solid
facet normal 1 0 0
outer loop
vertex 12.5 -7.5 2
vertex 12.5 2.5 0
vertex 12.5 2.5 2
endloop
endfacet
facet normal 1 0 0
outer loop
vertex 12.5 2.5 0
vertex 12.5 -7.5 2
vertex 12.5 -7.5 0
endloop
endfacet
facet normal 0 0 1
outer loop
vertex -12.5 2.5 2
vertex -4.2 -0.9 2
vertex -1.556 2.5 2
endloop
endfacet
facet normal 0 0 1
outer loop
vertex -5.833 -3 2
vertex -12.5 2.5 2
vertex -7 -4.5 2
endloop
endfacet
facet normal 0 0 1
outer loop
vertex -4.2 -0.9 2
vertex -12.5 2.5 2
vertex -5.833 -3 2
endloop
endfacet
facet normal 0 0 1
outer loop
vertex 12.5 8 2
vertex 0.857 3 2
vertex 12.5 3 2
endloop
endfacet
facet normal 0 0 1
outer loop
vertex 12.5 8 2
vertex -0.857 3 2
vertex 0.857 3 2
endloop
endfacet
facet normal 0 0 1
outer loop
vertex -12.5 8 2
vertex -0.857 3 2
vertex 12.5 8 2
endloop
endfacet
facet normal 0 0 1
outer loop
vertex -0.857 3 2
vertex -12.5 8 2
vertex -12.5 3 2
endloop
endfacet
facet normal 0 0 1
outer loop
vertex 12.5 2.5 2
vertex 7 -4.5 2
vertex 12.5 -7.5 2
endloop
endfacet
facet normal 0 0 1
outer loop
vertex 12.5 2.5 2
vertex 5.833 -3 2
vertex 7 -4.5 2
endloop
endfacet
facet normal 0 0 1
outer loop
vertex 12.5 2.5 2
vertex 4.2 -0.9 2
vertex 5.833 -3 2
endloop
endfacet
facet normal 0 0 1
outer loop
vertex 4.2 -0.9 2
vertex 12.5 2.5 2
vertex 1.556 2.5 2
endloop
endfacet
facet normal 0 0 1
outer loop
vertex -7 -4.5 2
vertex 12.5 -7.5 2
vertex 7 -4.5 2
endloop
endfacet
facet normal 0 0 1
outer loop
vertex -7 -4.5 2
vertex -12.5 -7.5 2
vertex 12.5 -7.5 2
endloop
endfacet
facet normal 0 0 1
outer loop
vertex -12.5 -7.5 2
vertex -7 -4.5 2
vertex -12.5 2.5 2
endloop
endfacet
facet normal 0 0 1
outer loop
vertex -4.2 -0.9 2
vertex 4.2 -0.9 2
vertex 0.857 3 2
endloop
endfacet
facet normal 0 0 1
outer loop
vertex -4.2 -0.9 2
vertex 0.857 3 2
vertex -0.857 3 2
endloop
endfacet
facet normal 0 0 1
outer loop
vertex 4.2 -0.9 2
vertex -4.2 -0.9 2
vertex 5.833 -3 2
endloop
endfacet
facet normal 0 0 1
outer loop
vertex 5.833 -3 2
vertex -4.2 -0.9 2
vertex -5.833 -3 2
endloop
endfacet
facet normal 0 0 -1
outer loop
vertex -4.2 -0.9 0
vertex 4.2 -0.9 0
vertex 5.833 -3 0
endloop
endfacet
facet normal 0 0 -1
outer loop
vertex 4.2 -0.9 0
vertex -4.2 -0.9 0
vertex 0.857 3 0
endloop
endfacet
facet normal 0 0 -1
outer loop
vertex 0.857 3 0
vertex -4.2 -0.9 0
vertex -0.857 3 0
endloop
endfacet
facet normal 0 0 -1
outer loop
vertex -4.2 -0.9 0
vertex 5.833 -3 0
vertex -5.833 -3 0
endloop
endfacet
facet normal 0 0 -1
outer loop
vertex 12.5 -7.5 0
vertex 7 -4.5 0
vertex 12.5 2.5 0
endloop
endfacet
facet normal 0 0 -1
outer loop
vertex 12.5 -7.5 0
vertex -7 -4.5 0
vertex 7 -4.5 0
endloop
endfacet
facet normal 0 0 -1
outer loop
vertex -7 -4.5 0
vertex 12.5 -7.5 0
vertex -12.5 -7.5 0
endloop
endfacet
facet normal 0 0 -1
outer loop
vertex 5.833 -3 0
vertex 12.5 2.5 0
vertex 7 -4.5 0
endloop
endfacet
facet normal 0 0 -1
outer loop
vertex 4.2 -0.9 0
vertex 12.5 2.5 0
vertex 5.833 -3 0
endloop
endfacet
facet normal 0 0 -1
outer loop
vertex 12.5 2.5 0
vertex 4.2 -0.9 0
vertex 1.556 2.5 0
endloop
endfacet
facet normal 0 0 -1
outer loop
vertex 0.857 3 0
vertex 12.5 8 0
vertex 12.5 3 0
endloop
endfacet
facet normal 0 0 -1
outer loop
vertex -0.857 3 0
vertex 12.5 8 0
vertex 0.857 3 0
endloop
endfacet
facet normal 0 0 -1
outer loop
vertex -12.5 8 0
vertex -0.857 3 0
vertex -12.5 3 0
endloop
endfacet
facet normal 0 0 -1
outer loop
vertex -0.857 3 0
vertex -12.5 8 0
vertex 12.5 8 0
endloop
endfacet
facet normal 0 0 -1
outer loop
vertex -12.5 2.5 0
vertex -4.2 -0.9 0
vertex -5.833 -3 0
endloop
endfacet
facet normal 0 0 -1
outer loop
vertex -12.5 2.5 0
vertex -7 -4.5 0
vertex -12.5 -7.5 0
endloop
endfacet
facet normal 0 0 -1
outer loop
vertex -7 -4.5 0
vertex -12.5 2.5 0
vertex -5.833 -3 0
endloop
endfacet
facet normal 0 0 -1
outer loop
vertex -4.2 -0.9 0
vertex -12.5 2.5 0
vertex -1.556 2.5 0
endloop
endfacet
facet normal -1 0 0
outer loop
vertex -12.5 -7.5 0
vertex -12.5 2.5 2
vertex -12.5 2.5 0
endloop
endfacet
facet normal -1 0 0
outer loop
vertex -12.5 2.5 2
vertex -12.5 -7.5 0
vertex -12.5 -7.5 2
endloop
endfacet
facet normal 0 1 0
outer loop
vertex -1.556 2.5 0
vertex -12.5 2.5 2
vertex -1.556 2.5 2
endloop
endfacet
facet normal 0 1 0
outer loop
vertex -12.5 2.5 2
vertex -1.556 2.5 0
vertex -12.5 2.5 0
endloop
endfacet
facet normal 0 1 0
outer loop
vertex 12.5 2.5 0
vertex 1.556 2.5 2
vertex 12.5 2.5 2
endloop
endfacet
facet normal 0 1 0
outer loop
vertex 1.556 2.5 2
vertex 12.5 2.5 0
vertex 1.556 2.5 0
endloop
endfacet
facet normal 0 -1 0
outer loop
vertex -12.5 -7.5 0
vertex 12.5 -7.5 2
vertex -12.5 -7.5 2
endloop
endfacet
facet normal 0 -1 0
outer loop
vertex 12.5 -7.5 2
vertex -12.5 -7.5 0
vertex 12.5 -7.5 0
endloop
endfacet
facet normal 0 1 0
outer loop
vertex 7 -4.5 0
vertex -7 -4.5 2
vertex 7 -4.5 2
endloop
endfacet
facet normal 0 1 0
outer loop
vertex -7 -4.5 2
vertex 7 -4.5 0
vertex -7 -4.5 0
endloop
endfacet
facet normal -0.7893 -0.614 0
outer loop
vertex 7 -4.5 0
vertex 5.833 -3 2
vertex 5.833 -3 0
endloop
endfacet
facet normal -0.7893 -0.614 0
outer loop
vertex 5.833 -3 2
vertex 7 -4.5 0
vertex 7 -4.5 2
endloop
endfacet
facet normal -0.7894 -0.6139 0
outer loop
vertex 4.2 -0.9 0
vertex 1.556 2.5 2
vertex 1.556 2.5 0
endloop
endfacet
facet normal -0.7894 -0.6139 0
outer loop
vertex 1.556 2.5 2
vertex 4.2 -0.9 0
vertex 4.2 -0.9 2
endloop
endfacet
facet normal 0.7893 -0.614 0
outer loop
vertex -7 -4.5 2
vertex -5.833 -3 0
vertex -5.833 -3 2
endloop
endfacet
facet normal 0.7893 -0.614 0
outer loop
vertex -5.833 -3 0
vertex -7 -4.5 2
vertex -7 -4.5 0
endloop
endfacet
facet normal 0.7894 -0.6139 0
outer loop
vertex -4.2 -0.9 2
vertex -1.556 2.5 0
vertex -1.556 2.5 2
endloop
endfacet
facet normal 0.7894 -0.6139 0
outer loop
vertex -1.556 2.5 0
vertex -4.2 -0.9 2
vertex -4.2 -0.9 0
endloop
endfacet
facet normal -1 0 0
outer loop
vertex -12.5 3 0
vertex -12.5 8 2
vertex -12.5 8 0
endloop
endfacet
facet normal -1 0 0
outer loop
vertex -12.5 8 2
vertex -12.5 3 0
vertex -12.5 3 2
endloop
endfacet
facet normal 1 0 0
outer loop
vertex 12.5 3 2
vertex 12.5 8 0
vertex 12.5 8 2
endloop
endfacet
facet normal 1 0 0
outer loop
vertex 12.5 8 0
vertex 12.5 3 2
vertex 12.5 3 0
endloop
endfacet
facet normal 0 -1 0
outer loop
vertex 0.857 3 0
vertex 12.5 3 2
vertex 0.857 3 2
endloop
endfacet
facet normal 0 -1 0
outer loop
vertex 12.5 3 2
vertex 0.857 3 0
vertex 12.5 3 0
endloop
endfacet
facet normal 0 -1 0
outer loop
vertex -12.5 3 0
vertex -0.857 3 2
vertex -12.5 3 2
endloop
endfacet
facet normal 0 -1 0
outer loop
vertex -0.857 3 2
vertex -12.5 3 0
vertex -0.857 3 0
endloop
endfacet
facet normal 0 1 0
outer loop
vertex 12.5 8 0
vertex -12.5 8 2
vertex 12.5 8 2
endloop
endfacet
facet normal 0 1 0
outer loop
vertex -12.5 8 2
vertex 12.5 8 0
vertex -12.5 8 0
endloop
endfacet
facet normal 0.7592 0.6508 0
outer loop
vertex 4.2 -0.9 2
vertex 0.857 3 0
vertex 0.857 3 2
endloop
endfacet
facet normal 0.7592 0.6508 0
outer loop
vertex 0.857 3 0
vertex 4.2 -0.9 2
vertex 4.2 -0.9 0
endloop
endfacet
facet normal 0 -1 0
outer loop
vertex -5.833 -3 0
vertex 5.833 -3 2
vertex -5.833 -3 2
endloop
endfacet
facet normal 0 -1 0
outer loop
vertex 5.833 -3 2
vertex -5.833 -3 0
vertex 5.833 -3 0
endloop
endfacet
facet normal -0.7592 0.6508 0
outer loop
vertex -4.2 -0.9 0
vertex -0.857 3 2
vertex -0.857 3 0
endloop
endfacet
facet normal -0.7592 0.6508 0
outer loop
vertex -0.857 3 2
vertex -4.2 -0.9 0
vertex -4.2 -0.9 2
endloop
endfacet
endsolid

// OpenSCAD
union() {
	difference() {
		union() {
			translate(v = [0, 0, 1.0000000000]) {
				cube(center = true, size = [25, 5, 2]);
			}
			translate(v = [0, -5, 0]) {
				translate(v = [0, 0, 1.0000000000]) {
					cube(center = true, size = [25, 5, 2]);
				}
			}
		}
		translate(v = [0, -4.5000000000, 0]) {
			translate(v = [-7.0000000000, 0, 0]) {
				linear_extrude(height = 2) {
					polygon(points = [[0, 0], [14, 0], [7.0000000000, 9]]);
				}
			}
		}
	}
	translate(v = [0, 5.5000000000, 0]) {
		rotate(a = [0, 0, 180]) {
			union() {
				translate(v = [0, 0, 1.0000000000]) {
					cube(center = true, size = [25, 5, 2]);
				}
				translate(v = [0, 5, 0]) {
					rotate(a = [0, 0, 180]) {
						translate(v = [0, -3.5000000000, 0]) {
							translate(v = [-6.0000000000, 0, 0]) {
								linear_extrude(height = 2) {
									polygon(points = [[0, 0], [12, 0], [6.0000000000, 7]]);
								}
							}
						}
					}
				}
			}
		}
	}
}
